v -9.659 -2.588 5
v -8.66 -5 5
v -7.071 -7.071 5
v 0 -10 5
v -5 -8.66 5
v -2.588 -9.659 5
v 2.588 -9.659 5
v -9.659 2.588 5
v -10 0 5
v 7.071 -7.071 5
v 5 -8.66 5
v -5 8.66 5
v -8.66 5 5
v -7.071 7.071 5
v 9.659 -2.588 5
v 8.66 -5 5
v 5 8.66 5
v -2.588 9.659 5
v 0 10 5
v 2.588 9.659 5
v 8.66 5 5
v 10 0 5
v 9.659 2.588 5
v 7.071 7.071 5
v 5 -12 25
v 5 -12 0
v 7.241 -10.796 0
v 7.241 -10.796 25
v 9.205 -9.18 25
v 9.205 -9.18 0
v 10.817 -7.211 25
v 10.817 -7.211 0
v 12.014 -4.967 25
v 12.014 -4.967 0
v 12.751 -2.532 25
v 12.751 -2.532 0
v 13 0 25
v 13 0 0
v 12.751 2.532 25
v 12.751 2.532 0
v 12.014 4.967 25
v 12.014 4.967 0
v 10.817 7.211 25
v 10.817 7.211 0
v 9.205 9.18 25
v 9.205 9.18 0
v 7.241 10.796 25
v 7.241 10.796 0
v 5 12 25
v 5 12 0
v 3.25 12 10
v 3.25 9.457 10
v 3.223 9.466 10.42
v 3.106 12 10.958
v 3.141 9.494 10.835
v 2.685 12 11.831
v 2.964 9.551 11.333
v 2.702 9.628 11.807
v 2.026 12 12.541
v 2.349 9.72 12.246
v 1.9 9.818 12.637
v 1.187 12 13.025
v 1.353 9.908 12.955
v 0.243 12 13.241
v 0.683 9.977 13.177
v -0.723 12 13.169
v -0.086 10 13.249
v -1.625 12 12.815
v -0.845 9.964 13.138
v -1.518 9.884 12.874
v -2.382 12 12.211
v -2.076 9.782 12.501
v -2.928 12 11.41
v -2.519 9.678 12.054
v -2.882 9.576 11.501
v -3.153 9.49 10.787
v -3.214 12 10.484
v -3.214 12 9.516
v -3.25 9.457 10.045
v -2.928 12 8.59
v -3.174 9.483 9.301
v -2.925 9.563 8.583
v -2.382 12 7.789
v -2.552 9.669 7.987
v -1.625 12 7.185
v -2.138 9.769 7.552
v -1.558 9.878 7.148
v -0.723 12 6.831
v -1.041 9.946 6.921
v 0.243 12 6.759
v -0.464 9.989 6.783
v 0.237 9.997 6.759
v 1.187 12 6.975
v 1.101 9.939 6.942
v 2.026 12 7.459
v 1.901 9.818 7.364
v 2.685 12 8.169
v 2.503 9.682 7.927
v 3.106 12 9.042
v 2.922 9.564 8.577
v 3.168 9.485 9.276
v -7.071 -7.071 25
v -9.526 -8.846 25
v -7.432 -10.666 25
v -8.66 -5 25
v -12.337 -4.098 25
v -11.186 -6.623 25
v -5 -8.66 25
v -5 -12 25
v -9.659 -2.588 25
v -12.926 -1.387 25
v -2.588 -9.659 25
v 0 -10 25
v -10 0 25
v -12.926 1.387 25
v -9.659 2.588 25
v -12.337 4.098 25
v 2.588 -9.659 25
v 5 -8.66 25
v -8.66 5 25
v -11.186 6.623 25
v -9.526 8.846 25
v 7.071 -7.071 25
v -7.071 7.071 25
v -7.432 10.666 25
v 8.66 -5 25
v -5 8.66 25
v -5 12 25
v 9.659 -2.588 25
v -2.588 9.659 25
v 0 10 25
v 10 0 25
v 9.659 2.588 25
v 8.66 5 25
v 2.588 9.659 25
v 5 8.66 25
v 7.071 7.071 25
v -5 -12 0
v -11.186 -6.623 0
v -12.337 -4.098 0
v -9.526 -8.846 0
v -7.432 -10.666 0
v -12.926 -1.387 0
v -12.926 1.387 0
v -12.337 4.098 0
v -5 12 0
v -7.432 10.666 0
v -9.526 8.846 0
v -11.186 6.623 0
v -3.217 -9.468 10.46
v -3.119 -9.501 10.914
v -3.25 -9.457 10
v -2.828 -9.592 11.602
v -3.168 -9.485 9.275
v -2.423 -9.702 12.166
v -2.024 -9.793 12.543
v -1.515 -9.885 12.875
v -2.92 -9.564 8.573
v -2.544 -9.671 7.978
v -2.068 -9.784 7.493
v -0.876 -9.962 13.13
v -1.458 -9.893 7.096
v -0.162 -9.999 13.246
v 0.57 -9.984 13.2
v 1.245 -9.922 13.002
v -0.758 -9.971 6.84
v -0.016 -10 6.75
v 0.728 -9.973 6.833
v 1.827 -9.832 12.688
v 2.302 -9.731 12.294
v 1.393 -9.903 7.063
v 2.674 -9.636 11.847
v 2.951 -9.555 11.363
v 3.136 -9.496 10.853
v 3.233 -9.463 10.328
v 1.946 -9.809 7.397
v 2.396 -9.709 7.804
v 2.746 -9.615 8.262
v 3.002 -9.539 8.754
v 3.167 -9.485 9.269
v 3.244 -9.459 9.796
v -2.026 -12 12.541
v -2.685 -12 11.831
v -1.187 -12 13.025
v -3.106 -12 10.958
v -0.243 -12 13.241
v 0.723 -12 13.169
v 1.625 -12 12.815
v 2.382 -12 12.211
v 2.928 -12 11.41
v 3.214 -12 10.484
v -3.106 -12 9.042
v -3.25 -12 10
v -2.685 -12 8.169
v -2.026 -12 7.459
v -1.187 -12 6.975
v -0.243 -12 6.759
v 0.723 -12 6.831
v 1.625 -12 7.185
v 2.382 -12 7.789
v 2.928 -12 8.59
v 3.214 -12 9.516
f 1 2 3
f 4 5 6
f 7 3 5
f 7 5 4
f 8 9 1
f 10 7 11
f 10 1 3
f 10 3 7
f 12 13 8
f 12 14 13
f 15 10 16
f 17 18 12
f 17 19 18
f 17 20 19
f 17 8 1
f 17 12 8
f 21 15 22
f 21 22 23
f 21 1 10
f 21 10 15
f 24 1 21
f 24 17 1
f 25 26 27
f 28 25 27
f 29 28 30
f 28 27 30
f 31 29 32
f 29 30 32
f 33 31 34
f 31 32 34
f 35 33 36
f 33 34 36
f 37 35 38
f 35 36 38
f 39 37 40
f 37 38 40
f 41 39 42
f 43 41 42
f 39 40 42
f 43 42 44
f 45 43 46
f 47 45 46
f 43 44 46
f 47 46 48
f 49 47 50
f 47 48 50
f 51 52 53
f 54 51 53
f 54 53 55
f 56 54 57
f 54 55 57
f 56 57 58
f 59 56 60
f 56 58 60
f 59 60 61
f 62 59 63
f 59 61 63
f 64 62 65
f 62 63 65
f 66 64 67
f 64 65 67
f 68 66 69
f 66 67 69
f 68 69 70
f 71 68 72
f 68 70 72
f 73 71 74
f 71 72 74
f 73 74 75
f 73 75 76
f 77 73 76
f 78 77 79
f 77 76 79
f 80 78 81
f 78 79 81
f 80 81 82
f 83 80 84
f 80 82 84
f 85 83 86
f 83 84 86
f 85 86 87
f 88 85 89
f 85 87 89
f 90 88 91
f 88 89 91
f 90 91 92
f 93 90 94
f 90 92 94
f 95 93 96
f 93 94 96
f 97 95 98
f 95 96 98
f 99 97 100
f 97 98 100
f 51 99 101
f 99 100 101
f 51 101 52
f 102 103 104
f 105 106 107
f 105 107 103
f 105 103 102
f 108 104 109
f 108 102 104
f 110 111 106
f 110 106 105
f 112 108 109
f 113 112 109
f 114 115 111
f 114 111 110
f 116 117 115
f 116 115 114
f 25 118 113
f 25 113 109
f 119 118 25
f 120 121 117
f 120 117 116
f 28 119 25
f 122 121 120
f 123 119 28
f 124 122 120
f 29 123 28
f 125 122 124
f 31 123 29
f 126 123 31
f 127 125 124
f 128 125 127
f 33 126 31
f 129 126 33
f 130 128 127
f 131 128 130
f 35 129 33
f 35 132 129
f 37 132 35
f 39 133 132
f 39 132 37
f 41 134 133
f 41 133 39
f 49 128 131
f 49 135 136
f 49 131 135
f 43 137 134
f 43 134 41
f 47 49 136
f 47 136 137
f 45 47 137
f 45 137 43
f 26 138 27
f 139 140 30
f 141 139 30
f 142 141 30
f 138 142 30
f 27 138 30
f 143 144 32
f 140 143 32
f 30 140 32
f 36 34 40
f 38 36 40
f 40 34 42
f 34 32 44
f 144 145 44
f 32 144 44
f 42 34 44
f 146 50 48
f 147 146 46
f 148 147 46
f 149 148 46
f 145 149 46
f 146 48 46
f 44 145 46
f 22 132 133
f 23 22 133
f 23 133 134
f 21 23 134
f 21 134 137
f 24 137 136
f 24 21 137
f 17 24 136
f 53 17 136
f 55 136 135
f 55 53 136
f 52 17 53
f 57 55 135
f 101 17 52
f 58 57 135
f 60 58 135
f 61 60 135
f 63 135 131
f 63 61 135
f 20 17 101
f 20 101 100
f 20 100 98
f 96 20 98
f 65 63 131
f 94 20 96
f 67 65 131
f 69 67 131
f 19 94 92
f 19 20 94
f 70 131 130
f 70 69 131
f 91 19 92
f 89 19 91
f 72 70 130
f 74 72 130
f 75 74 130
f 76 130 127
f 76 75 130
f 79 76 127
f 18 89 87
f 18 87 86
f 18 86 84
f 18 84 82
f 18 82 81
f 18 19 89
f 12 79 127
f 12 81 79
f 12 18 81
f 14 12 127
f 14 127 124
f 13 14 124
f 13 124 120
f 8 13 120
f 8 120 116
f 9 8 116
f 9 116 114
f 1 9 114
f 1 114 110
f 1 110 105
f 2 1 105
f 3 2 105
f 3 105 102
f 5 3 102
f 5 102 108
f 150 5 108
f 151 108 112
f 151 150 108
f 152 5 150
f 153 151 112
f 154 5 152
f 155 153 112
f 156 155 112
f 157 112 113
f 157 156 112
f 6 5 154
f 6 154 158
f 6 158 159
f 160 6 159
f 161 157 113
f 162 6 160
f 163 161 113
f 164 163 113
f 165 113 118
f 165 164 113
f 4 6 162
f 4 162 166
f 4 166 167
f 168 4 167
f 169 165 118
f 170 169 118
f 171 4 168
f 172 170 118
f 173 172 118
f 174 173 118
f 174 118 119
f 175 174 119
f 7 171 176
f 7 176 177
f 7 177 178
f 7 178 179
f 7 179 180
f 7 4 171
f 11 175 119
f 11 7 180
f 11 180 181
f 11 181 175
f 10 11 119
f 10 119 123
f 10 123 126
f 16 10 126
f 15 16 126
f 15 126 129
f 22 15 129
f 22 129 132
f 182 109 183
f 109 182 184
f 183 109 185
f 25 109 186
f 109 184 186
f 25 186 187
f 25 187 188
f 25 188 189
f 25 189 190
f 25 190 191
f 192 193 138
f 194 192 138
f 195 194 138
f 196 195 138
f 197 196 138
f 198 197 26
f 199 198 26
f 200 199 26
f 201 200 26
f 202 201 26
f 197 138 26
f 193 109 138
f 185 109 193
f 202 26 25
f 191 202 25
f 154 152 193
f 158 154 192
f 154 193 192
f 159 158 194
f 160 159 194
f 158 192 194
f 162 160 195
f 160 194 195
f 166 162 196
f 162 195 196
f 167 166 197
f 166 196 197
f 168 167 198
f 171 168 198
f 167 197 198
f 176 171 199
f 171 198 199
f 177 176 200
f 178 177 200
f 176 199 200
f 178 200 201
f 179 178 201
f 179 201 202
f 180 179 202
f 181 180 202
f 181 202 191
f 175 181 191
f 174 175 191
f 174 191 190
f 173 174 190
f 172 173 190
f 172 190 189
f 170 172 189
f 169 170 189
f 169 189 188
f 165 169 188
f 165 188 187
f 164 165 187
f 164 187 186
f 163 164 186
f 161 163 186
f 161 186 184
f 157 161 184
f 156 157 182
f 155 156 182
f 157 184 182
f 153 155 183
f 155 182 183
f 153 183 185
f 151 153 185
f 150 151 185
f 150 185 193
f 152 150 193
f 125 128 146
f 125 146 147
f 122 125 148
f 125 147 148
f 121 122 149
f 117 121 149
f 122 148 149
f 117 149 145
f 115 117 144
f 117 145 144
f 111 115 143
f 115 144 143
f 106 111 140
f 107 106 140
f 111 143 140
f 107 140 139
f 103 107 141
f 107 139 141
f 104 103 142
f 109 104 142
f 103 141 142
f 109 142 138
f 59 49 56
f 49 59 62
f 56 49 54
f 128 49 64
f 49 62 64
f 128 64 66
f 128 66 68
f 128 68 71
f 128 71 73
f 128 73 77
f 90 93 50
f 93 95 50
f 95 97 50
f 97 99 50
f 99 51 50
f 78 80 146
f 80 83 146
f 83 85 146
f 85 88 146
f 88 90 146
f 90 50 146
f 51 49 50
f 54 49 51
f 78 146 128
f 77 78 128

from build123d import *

# Parameters (mm, degrees)
F0_R     = 10
F1_DEPTH = 5
F2_DEPTH = 25
F4_D     = 6.5
F4_DEPTH = 12.001
F6_D     = 6.5


with BuildPart() as f1:
    # F0 (on Top) → F1 (new body)
    with BuildSketch(Plane.XY):
        with BuildLine():
            ThreePointArc((5, -12), (10.8166538264, -7.2111025509), (13, 0))
            ThreePointArc((13, 0), (10.8166538264, 7.2111025509), (5, 12))
            Line((5, 12), (-5, 12))
            ThreePointArc((-5, 12), (-13, 0), (-5, -12))
            Line((-5, -12), (5, -12))
        make_face()
        Circle(F0_R, mode=Mode.SUBTRACT)
        Circle(F0_R)
    extrude(amount=F1_DEPTH)

    # F0 (on Top) → F2 (join)
    with BuildSketch(Plane.XY):
        with BuildLine():
            ThreePointArc((5, -12), (10.8166538264, -7.2111025509), (13, 0))
            ThreePointArc((13, 0), (10.8166538264, 7.2111025509), (5, 12))
            Line((5, 12), (-5, 12))
            ThreePointArc((-5, 12), (-13, 0), (-5, -12))
            Line((-5, -12), (5, -12))
        make_face()
        Circle(F0_R, mode=Mode.SUBTRACT)
    extrude(amount=F2_DEPTH)

    # F4 (through all, one way)
    with BuildSketch(Plane.XZ):
        with Locations((0, 10)):
            Circle(F4_D / 2)
    extrude(amount=-F4_DEPTH, mode=Mode.SUBTRACT)

    # F6 (through all)
    with Locations(Plane(origin=(0, 0, 0), x_dir=(1, 0, 0), z_dir=(0, 1, 0))):
        with Locations((0, -10)):
            Hole(F6_D / 2)


solid = f1.part
